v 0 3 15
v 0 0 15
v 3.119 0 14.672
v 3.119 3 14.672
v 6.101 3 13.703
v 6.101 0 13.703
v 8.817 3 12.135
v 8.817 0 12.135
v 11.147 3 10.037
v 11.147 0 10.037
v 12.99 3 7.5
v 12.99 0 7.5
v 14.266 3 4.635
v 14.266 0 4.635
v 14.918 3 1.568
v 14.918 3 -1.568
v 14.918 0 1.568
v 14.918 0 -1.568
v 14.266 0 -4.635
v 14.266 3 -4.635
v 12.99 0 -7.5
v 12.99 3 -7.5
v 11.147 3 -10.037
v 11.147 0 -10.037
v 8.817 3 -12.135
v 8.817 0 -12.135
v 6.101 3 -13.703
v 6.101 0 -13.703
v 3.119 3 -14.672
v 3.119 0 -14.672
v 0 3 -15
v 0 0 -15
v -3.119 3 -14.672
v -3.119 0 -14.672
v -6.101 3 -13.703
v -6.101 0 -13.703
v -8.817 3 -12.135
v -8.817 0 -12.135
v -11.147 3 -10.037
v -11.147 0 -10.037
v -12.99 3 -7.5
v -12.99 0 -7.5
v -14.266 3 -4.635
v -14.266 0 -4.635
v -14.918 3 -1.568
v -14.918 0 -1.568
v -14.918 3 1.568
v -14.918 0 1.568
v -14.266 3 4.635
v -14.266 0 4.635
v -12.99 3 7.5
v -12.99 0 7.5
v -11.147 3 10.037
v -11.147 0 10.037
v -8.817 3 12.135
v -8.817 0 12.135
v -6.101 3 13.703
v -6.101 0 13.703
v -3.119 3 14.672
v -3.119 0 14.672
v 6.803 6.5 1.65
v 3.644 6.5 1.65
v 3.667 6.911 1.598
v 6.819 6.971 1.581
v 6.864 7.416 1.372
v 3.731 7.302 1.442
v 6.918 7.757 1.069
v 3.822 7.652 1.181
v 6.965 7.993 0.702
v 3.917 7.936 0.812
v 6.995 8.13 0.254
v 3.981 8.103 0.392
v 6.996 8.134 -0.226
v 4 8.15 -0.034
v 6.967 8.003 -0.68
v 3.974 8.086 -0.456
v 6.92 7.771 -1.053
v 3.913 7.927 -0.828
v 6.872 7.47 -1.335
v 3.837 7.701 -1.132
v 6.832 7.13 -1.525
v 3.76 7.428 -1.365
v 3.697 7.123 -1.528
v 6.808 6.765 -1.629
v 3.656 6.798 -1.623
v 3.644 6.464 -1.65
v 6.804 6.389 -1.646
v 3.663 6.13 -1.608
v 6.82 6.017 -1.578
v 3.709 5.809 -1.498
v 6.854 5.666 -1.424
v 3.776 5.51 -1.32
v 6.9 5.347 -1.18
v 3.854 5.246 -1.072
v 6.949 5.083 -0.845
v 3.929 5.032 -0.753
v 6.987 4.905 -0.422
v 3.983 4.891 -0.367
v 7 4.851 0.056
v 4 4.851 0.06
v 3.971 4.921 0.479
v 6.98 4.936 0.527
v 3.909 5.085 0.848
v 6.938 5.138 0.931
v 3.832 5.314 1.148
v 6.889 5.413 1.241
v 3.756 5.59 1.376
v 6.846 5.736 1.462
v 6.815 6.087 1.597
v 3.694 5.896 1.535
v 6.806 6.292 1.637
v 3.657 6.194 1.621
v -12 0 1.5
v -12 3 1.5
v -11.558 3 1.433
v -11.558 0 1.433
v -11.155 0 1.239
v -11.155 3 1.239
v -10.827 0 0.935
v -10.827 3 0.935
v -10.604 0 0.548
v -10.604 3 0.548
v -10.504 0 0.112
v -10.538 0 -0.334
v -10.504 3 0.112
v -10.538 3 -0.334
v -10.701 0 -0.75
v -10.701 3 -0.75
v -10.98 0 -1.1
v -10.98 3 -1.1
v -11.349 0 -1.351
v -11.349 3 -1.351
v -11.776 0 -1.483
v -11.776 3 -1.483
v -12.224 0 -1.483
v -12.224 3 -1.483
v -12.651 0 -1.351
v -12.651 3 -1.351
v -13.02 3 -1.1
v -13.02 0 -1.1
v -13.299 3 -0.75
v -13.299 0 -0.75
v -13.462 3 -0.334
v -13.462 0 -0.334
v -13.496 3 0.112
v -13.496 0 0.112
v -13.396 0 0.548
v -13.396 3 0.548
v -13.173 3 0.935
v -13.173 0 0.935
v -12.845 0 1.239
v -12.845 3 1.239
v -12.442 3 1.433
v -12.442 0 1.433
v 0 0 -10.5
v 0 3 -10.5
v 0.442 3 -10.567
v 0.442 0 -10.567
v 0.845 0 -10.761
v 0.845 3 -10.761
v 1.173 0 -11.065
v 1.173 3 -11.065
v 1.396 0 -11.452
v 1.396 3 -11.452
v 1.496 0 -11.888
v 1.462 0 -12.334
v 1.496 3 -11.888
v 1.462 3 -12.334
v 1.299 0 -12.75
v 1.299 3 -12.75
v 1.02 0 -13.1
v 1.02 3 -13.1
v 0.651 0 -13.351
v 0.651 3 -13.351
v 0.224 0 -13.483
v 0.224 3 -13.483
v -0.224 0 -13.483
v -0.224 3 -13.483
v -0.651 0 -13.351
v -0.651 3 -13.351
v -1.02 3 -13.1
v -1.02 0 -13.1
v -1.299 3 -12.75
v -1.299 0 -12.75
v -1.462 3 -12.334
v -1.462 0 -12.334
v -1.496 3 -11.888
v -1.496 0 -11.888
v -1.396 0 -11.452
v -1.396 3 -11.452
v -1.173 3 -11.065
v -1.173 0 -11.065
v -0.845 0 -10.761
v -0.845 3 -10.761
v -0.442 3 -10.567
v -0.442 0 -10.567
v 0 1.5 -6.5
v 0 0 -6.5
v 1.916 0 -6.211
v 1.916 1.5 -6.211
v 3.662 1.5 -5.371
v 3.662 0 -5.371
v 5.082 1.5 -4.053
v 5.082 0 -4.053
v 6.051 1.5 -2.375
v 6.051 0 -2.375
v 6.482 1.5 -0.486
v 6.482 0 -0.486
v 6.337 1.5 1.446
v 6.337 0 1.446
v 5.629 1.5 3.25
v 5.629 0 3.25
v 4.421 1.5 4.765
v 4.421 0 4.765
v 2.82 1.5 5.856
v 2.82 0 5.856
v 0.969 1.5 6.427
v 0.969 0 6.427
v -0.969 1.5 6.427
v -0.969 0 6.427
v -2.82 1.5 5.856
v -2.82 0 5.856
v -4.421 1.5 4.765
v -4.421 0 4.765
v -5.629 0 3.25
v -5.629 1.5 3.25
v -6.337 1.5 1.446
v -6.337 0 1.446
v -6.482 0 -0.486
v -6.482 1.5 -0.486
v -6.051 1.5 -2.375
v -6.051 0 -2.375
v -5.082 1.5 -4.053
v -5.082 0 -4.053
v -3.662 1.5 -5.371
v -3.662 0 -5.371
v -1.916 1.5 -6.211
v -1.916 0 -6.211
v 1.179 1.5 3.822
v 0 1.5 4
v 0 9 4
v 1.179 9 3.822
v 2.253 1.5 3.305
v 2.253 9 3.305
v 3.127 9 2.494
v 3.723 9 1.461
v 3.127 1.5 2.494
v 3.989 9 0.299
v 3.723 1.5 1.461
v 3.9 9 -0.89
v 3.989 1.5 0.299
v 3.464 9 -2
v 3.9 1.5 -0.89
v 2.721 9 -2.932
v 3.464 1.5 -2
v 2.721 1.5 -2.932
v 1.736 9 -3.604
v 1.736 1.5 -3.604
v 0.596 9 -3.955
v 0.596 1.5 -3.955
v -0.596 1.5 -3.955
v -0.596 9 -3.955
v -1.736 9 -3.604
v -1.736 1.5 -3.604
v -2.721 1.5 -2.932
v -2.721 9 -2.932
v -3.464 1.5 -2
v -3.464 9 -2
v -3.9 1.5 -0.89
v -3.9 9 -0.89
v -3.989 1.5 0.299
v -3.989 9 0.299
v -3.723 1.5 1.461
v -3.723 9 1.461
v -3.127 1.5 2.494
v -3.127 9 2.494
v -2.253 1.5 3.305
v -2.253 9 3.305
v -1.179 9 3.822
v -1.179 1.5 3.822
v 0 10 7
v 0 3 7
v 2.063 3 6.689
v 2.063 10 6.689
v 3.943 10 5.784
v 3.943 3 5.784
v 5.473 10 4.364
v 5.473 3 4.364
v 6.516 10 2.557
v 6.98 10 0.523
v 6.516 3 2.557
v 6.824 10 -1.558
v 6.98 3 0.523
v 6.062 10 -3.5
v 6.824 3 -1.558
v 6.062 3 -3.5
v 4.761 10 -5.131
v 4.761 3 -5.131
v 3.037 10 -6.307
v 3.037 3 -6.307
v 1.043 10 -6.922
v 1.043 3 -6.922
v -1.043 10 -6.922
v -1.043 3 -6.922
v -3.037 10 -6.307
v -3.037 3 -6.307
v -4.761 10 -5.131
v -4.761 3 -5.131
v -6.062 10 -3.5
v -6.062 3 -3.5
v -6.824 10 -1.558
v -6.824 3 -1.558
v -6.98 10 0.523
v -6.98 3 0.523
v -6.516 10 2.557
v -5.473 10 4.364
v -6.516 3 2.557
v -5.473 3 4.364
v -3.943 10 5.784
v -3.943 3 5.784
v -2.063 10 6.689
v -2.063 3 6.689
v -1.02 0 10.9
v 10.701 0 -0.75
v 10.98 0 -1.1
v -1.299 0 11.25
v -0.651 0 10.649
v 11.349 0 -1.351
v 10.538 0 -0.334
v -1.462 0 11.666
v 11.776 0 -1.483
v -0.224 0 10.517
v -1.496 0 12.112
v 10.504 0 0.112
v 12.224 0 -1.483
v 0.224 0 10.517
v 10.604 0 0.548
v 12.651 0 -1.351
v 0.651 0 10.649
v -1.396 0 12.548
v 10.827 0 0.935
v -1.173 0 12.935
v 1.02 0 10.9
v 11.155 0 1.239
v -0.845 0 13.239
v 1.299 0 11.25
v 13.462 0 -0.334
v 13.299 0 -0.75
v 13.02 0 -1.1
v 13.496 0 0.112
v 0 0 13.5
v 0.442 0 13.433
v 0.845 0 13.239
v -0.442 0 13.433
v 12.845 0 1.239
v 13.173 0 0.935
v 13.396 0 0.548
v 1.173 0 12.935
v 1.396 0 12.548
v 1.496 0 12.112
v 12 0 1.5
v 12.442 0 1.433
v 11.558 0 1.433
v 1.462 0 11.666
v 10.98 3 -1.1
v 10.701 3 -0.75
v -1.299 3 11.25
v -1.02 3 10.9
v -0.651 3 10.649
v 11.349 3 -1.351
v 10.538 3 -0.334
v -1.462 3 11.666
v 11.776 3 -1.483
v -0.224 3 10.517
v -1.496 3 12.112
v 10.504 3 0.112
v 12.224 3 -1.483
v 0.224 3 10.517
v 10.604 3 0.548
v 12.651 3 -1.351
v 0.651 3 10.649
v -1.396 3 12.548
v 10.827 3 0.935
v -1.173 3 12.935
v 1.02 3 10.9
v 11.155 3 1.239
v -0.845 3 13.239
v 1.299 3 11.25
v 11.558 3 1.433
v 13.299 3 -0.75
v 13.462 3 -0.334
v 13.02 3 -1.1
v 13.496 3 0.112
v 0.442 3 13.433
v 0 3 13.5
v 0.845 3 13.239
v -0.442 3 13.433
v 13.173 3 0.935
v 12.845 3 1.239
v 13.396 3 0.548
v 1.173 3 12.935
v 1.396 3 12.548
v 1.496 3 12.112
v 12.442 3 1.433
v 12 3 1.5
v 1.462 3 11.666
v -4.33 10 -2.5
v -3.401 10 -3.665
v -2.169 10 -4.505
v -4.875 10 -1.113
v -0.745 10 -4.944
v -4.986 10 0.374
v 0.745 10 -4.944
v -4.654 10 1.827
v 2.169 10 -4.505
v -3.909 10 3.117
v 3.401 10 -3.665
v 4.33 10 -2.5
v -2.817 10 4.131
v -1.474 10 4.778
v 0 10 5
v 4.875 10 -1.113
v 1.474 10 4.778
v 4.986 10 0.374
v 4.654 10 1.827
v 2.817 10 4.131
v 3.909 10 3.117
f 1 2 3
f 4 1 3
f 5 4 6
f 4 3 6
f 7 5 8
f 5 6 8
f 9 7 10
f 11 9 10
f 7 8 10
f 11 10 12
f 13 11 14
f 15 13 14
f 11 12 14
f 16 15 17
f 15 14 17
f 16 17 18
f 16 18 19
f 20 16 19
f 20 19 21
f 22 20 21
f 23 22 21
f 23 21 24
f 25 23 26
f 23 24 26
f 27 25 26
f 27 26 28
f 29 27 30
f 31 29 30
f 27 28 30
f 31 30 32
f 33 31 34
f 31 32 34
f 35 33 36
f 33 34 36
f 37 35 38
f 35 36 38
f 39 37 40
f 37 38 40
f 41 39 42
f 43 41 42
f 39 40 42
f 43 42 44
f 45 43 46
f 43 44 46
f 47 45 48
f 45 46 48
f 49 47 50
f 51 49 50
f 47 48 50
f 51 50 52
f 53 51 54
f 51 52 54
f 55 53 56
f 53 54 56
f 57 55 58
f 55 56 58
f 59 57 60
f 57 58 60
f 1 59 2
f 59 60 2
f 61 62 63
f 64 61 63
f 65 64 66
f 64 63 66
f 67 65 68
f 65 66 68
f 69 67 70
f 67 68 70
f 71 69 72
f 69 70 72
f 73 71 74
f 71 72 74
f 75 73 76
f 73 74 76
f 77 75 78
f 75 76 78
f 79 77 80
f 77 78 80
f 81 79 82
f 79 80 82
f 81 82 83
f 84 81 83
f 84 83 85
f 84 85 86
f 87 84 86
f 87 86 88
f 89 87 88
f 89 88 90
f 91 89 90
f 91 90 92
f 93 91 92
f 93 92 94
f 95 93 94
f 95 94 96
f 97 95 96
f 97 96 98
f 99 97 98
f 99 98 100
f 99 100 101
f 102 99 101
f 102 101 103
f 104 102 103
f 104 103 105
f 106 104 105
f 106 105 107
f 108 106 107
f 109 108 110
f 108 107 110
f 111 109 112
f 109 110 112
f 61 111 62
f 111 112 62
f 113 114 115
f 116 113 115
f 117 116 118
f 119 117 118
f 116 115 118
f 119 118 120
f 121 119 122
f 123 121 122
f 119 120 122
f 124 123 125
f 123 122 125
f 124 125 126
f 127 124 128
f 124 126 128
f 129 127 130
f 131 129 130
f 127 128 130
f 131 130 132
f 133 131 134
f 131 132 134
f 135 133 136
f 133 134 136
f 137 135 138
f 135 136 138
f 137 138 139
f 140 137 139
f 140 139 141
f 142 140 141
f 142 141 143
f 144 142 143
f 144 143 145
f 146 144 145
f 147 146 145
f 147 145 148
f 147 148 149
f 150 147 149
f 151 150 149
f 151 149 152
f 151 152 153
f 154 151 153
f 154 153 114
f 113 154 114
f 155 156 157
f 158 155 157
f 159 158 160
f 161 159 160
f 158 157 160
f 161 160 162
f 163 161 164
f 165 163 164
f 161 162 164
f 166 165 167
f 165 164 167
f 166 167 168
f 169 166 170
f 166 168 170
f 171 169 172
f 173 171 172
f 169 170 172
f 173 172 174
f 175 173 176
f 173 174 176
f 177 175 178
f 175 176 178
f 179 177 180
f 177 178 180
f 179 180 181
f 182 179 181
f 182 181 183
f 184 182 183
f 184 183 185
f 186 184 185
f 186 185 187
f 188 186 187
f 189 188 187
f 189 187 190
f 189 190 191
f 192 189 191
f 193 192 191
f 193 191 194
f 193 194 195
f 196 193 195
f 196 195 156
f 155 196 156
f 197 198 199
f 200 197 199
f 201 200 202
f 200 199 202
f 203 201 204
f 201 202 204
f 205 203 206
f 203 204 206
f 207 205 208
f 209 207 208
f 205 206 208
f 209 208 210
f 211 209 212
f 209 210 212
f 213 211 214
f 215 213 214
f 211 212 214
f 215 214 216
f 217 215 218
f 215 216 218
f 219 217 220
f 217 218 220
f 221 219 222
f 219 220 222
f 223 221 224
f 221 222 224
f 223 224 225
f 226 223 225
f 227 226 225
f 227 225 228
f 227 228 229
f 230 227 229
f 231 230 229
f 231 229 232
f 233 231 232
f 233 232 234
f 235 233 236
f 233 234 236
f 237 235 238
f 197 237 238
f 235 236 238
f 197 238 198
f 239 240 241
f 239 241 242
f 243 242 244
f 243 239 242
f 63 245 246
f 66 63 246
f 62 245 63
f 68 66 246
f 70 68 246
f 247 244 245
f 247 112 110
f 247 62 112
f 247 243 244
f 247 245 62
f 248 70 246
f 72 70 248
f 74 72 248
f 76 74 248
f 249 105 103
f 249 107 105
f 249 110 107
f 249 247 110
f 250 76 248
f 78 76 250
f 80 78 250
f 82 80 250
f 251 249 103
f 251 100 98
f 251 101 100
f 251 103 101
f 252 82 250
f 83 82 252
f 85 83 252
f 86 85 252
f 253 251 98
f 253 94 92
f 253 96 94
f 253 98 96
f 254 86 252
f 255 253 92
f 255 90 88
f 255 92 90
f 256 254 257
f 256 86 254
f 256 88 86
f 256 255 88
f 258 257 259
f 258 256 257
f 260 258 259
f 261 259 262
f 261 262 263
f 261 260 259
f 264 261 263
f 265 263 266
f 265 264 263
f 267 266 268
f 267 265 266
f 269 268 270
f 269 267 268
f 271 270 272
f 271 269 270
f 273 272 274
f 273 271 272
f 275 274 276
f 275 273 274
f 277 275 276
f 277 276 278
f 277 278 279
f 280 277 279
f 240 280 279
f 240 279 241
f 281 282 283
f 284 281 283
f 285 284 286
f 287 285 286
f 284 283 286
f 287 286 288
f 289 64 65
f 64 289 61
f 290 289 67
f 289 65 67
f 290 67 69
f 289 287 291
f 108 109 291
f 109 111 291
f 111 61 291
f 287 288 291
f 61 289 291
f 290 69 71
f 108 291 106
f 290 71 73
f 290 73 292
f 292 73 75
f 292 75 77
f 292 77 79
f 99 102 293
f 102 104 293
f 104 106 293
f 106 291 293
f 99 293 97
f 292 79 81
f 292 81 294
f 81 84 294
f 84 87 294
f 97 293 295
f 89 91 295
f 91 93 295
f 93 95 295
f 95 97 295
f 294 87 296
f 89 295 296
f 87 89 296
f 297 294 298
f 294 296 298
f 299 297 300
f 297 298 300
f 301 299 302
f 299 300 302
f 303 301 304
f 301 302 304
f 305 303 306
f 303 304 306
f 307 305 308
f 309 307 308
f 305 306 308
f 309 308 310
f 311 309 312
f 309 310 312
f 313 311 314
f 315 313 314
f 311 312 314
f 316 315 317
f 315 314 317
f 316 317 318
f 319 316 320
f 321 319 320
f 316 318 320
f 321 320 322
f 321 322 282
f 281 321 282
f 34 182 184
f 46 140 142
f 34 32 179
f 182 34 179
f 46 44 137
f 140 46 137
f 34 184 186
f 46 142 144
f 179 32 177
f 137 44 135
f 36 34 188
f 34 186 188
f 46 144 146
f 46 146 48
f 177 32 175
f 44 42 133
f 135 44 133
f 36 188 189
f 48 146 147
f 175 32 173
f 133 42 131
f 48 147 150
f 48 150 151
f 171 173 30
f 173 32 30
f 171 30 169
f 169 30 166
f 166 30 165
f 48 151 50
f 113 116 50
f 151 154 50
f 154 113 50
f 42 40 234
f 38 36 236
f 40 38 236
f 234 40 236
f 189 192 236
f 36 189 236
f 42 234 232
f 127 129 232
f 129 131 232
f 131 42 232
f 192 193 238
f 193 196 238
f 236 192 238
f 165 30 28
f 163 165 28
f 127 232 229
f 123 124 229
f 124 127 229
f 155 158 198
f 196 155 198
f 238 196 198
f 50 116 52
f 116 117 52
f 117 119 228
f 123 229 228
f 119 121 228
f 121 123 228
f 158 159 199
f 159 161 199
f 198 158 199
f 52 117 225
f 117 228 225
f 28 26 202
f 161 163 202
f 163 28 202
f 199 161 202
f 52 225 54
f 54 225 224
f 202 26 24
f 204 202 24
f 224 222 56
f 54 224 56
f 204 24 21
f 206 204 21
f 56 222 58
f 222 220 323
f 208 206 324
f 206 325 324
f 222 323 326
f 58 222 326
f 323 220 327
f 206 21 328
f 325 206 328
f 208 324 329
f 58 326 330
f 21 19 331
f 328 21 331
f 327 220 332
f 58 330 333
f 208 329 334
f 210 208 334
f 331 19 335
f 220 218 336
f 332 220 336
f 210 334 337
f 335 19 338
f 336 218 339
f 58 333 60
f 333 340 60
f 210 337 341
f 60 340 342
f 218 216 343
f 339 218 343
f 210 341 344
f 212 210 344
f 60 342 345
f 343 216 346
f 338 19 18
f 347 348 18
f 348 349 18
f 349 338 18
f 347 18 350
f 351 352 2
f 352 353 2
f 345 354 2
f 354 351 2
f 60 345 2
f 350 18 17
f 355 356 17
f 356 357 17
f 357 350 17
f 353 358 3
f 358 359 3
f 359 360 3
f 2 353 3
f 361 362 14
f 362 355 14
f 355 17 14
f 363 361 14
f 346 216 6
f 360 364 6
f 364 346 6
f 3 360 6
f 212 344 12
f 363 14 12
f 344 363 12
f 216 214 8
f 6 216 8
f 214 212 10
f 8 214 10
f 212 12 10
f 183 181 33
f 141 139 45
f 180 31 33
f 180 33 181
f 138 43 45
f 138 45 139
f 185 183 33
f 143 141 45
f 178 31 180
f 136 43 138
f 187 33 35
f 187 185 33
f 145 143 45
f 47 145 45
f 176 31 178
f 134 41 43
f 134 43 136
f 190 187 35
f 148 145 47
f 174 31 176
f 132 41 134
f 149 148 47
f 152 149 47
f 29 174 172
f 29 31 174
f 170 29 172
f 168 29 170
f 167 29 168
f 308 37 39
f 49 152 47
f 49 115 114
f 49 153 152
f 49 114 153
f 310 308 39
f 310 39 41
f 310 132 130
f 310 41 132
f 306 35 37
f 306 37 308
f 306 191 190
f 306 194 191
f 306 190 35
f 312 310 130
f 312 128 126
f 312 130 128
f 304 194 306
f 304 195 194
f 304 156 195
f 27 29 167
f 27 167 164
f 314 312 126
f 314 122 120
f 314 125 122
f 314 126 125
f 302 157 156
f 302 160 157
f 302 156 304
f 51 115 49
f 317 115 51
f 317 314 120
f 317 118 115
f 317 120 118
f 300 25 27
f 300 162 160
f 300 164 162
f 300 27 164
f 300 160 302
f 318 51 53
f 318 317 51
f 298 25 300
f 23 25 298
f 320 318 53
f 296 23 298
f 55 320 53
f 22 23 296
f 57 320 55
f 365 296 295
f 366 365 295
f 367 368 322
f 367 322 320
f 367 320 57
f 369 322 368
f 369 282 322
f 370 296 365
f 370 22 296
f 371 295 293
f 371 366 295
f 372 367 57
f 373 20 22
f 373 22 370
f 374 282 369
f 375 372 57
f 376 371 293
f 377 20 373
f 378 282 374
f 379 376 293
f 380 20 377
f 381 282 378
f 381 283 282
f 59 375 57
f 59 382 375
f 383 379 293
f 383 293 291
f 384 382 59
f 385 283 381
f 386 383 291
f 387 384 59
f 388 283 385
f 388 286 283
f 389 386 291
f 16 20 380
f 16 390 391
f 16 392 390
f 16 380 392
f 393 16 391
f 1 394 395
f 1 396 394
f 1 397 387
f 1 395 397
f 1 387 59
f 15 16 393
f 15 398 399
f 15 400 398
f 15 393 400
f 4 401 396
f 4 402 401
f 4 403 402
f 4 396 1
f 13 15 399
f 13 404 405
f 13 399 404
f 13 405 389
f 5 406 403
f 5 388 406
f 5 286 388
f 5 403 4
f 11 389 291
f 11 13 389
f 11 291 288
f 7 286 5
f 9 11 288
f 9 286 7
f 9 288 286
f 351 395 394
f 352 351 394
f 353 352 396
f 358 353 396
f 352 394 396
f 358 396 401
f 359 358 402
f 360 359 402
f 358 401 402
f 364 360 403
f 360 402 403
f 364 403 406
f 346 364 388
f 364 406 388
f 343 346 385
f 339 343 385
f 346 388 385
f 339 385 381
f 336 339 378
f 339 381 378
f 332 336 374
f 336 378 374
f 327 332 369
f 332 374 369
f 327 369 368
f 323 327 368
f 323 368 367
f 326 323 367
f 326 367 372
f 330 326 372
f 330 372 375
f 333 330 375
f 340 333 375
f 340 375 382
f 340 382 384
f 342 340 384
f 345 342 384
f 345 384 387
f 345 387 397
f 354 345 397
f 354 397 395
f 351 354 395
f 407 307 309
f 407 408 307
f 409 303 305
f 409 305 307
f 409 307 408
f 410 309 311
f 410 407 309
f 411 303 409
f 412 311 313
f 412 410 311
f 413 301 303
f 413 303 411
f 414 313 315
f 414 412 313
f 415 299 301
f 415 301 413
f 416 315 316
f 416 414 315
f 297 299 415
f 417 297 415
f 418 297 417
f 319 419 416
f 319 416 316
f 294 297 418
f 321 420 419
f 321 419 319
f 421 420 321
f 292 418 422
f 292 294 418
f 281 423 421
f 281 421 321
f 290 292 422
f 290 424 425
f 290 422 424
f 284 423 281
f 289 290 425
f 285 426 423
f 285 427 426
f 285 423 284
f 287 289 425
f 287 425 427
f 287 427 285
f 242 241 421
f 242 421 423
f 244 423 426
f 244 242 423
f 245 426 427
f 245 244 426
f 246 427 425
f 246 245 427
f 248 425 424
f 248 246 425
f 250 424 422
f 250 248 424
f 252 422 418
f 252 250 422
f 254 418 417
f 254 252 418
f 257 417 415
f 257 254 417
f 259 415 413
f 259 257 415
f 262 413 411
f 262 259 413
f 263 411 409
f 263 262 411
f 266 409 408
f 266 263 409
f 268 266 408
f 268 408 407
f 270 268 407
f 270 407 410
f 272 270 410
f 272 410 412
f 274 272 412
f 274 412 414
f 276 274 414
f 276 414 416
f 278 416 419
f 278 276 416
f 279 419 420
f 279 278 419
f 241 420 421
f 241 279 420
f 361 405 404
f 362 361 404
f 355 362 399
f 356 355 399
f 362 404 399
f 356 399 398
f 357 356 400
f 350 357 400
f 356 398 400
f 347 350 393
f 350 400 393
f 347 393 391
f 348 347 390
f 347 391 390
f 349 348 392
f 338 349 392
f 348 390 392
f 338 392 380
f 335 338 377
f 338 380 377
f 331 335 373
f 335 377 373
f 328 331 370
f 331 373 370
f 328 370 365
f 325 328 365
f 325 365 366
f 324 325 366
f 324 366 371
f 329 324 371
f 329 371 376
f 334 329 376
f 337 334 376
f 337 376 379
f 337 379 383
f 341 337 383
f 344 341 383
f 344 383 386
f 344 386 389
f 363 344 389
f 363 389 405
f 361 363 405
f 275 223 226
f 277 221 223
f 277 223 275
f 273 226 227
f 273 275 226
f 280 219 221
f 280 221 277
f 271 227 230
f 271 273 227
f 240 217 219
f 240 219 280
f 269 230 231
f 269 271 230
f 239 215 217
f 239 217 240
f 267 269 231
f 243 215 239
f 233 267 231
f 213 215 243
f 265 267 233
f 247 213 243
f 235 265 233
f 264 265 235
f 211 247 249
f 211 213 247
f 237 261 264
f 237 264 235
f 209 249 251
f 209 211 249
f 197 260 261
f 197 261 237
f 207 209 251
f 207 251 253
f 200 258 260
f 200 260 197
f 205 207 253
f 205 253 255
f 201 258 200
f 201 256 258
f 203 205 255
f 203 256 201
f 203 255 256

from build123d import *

# Parameters (mm, degrees)
SKETCH_1_R          = 15
SKETCH_1_R_2        = 4
EXTRUDE_1_DEPTH     = 3
SKETCH_2_R          = 7
SKETCH_2_R_2        = 4
EXTRUDE_2_DEPTH     = 7
SKETCH_5_R          = 1.65
CUT_EXTRUDE_1_DEPTH = 12
SKETCH_6_R          = 6.5
CUT_EXTRUDE_2_DEPTH = 1.5
SKETCH_7_R          = 1.5
CUT_EXTRUDE_3_DEPTH = 4
CHAMFER_1_SIZE      = 1


with BuildPart() as part:
    # 草图1 → 凸台-拉伸1 (new body)
    with BuildSketch(Plane(origin=(0, 0, 0), x_dir=(1, 0, 0), z_dir=(0, 1, 0))):
        Circle(SKETCH_1_R)
        Circle(SKETCH_1_R_2, mode=Mode.SUBTRACT)
    extrude(amount=EXTRUDE_1_DEPTH)

    # 草图2 → 凸台-拉伸2 (add)
    with BuildSketch(Plane(origin=(0, 3, 0), x_dir=(1, 0, 0), z_dir=(0, 1, 0))):
        Circle(SKETCH_2_R)
        Circle(SKETCH_2_R_2, mode=Mode.SUBTRACT)
    extrude(amount=EXTRUDE_2_DEPTH)

    # 草图5 → 切除-拉伸1 (cut)
    with BuildSketch(Plane.ZY):
        with Locations((0, 6.5)):
            Circle(SKETCH_5_R)
    extrude(amount=-CUT_EXTRUDE_1_DEPTH, mode=Mode.SUBTRACT)

    # 草图6 → 切除-拉伸2 (cut)
    with BuildSketch(Plane.XZ):
        Circle(SKETCH_6_R)
    extrude(amount=-CUT_EXTRUDE_2_DEPTH, mode=Mode.SUBTRACT)

    # 草图7 → 切除-拉伸3 (cut)
    with BuildSketch(Plane(origin=(0, 3, 0), x_dir=(1, 0, 0), z_dir=(0, 1, 0))):
        with Locations((0, -12)):
            Circle(SKETCH_7_R)
        with Locations((-12, 0)):
            Circle(SKETCH_7_R)
        with Locations((0, 12)):
            Circle(SKETCH_7_R)
        with Locations((12, 0)):
            Circle(SKETCH_7_R)
    extrude(amount=-CUT_EXTRUDE_3_DEPTH, mode=Mode.SUBTRACT)

    # 倒角1
    chamfer_1_edges = [part.edges().sort_by_distance(p)[0] for p in [
        (-4, 10, 0),
    ]]
    chamfer(chamfer_1_edges, length=CHAMFER_1_SIZE)


solid = part.part
